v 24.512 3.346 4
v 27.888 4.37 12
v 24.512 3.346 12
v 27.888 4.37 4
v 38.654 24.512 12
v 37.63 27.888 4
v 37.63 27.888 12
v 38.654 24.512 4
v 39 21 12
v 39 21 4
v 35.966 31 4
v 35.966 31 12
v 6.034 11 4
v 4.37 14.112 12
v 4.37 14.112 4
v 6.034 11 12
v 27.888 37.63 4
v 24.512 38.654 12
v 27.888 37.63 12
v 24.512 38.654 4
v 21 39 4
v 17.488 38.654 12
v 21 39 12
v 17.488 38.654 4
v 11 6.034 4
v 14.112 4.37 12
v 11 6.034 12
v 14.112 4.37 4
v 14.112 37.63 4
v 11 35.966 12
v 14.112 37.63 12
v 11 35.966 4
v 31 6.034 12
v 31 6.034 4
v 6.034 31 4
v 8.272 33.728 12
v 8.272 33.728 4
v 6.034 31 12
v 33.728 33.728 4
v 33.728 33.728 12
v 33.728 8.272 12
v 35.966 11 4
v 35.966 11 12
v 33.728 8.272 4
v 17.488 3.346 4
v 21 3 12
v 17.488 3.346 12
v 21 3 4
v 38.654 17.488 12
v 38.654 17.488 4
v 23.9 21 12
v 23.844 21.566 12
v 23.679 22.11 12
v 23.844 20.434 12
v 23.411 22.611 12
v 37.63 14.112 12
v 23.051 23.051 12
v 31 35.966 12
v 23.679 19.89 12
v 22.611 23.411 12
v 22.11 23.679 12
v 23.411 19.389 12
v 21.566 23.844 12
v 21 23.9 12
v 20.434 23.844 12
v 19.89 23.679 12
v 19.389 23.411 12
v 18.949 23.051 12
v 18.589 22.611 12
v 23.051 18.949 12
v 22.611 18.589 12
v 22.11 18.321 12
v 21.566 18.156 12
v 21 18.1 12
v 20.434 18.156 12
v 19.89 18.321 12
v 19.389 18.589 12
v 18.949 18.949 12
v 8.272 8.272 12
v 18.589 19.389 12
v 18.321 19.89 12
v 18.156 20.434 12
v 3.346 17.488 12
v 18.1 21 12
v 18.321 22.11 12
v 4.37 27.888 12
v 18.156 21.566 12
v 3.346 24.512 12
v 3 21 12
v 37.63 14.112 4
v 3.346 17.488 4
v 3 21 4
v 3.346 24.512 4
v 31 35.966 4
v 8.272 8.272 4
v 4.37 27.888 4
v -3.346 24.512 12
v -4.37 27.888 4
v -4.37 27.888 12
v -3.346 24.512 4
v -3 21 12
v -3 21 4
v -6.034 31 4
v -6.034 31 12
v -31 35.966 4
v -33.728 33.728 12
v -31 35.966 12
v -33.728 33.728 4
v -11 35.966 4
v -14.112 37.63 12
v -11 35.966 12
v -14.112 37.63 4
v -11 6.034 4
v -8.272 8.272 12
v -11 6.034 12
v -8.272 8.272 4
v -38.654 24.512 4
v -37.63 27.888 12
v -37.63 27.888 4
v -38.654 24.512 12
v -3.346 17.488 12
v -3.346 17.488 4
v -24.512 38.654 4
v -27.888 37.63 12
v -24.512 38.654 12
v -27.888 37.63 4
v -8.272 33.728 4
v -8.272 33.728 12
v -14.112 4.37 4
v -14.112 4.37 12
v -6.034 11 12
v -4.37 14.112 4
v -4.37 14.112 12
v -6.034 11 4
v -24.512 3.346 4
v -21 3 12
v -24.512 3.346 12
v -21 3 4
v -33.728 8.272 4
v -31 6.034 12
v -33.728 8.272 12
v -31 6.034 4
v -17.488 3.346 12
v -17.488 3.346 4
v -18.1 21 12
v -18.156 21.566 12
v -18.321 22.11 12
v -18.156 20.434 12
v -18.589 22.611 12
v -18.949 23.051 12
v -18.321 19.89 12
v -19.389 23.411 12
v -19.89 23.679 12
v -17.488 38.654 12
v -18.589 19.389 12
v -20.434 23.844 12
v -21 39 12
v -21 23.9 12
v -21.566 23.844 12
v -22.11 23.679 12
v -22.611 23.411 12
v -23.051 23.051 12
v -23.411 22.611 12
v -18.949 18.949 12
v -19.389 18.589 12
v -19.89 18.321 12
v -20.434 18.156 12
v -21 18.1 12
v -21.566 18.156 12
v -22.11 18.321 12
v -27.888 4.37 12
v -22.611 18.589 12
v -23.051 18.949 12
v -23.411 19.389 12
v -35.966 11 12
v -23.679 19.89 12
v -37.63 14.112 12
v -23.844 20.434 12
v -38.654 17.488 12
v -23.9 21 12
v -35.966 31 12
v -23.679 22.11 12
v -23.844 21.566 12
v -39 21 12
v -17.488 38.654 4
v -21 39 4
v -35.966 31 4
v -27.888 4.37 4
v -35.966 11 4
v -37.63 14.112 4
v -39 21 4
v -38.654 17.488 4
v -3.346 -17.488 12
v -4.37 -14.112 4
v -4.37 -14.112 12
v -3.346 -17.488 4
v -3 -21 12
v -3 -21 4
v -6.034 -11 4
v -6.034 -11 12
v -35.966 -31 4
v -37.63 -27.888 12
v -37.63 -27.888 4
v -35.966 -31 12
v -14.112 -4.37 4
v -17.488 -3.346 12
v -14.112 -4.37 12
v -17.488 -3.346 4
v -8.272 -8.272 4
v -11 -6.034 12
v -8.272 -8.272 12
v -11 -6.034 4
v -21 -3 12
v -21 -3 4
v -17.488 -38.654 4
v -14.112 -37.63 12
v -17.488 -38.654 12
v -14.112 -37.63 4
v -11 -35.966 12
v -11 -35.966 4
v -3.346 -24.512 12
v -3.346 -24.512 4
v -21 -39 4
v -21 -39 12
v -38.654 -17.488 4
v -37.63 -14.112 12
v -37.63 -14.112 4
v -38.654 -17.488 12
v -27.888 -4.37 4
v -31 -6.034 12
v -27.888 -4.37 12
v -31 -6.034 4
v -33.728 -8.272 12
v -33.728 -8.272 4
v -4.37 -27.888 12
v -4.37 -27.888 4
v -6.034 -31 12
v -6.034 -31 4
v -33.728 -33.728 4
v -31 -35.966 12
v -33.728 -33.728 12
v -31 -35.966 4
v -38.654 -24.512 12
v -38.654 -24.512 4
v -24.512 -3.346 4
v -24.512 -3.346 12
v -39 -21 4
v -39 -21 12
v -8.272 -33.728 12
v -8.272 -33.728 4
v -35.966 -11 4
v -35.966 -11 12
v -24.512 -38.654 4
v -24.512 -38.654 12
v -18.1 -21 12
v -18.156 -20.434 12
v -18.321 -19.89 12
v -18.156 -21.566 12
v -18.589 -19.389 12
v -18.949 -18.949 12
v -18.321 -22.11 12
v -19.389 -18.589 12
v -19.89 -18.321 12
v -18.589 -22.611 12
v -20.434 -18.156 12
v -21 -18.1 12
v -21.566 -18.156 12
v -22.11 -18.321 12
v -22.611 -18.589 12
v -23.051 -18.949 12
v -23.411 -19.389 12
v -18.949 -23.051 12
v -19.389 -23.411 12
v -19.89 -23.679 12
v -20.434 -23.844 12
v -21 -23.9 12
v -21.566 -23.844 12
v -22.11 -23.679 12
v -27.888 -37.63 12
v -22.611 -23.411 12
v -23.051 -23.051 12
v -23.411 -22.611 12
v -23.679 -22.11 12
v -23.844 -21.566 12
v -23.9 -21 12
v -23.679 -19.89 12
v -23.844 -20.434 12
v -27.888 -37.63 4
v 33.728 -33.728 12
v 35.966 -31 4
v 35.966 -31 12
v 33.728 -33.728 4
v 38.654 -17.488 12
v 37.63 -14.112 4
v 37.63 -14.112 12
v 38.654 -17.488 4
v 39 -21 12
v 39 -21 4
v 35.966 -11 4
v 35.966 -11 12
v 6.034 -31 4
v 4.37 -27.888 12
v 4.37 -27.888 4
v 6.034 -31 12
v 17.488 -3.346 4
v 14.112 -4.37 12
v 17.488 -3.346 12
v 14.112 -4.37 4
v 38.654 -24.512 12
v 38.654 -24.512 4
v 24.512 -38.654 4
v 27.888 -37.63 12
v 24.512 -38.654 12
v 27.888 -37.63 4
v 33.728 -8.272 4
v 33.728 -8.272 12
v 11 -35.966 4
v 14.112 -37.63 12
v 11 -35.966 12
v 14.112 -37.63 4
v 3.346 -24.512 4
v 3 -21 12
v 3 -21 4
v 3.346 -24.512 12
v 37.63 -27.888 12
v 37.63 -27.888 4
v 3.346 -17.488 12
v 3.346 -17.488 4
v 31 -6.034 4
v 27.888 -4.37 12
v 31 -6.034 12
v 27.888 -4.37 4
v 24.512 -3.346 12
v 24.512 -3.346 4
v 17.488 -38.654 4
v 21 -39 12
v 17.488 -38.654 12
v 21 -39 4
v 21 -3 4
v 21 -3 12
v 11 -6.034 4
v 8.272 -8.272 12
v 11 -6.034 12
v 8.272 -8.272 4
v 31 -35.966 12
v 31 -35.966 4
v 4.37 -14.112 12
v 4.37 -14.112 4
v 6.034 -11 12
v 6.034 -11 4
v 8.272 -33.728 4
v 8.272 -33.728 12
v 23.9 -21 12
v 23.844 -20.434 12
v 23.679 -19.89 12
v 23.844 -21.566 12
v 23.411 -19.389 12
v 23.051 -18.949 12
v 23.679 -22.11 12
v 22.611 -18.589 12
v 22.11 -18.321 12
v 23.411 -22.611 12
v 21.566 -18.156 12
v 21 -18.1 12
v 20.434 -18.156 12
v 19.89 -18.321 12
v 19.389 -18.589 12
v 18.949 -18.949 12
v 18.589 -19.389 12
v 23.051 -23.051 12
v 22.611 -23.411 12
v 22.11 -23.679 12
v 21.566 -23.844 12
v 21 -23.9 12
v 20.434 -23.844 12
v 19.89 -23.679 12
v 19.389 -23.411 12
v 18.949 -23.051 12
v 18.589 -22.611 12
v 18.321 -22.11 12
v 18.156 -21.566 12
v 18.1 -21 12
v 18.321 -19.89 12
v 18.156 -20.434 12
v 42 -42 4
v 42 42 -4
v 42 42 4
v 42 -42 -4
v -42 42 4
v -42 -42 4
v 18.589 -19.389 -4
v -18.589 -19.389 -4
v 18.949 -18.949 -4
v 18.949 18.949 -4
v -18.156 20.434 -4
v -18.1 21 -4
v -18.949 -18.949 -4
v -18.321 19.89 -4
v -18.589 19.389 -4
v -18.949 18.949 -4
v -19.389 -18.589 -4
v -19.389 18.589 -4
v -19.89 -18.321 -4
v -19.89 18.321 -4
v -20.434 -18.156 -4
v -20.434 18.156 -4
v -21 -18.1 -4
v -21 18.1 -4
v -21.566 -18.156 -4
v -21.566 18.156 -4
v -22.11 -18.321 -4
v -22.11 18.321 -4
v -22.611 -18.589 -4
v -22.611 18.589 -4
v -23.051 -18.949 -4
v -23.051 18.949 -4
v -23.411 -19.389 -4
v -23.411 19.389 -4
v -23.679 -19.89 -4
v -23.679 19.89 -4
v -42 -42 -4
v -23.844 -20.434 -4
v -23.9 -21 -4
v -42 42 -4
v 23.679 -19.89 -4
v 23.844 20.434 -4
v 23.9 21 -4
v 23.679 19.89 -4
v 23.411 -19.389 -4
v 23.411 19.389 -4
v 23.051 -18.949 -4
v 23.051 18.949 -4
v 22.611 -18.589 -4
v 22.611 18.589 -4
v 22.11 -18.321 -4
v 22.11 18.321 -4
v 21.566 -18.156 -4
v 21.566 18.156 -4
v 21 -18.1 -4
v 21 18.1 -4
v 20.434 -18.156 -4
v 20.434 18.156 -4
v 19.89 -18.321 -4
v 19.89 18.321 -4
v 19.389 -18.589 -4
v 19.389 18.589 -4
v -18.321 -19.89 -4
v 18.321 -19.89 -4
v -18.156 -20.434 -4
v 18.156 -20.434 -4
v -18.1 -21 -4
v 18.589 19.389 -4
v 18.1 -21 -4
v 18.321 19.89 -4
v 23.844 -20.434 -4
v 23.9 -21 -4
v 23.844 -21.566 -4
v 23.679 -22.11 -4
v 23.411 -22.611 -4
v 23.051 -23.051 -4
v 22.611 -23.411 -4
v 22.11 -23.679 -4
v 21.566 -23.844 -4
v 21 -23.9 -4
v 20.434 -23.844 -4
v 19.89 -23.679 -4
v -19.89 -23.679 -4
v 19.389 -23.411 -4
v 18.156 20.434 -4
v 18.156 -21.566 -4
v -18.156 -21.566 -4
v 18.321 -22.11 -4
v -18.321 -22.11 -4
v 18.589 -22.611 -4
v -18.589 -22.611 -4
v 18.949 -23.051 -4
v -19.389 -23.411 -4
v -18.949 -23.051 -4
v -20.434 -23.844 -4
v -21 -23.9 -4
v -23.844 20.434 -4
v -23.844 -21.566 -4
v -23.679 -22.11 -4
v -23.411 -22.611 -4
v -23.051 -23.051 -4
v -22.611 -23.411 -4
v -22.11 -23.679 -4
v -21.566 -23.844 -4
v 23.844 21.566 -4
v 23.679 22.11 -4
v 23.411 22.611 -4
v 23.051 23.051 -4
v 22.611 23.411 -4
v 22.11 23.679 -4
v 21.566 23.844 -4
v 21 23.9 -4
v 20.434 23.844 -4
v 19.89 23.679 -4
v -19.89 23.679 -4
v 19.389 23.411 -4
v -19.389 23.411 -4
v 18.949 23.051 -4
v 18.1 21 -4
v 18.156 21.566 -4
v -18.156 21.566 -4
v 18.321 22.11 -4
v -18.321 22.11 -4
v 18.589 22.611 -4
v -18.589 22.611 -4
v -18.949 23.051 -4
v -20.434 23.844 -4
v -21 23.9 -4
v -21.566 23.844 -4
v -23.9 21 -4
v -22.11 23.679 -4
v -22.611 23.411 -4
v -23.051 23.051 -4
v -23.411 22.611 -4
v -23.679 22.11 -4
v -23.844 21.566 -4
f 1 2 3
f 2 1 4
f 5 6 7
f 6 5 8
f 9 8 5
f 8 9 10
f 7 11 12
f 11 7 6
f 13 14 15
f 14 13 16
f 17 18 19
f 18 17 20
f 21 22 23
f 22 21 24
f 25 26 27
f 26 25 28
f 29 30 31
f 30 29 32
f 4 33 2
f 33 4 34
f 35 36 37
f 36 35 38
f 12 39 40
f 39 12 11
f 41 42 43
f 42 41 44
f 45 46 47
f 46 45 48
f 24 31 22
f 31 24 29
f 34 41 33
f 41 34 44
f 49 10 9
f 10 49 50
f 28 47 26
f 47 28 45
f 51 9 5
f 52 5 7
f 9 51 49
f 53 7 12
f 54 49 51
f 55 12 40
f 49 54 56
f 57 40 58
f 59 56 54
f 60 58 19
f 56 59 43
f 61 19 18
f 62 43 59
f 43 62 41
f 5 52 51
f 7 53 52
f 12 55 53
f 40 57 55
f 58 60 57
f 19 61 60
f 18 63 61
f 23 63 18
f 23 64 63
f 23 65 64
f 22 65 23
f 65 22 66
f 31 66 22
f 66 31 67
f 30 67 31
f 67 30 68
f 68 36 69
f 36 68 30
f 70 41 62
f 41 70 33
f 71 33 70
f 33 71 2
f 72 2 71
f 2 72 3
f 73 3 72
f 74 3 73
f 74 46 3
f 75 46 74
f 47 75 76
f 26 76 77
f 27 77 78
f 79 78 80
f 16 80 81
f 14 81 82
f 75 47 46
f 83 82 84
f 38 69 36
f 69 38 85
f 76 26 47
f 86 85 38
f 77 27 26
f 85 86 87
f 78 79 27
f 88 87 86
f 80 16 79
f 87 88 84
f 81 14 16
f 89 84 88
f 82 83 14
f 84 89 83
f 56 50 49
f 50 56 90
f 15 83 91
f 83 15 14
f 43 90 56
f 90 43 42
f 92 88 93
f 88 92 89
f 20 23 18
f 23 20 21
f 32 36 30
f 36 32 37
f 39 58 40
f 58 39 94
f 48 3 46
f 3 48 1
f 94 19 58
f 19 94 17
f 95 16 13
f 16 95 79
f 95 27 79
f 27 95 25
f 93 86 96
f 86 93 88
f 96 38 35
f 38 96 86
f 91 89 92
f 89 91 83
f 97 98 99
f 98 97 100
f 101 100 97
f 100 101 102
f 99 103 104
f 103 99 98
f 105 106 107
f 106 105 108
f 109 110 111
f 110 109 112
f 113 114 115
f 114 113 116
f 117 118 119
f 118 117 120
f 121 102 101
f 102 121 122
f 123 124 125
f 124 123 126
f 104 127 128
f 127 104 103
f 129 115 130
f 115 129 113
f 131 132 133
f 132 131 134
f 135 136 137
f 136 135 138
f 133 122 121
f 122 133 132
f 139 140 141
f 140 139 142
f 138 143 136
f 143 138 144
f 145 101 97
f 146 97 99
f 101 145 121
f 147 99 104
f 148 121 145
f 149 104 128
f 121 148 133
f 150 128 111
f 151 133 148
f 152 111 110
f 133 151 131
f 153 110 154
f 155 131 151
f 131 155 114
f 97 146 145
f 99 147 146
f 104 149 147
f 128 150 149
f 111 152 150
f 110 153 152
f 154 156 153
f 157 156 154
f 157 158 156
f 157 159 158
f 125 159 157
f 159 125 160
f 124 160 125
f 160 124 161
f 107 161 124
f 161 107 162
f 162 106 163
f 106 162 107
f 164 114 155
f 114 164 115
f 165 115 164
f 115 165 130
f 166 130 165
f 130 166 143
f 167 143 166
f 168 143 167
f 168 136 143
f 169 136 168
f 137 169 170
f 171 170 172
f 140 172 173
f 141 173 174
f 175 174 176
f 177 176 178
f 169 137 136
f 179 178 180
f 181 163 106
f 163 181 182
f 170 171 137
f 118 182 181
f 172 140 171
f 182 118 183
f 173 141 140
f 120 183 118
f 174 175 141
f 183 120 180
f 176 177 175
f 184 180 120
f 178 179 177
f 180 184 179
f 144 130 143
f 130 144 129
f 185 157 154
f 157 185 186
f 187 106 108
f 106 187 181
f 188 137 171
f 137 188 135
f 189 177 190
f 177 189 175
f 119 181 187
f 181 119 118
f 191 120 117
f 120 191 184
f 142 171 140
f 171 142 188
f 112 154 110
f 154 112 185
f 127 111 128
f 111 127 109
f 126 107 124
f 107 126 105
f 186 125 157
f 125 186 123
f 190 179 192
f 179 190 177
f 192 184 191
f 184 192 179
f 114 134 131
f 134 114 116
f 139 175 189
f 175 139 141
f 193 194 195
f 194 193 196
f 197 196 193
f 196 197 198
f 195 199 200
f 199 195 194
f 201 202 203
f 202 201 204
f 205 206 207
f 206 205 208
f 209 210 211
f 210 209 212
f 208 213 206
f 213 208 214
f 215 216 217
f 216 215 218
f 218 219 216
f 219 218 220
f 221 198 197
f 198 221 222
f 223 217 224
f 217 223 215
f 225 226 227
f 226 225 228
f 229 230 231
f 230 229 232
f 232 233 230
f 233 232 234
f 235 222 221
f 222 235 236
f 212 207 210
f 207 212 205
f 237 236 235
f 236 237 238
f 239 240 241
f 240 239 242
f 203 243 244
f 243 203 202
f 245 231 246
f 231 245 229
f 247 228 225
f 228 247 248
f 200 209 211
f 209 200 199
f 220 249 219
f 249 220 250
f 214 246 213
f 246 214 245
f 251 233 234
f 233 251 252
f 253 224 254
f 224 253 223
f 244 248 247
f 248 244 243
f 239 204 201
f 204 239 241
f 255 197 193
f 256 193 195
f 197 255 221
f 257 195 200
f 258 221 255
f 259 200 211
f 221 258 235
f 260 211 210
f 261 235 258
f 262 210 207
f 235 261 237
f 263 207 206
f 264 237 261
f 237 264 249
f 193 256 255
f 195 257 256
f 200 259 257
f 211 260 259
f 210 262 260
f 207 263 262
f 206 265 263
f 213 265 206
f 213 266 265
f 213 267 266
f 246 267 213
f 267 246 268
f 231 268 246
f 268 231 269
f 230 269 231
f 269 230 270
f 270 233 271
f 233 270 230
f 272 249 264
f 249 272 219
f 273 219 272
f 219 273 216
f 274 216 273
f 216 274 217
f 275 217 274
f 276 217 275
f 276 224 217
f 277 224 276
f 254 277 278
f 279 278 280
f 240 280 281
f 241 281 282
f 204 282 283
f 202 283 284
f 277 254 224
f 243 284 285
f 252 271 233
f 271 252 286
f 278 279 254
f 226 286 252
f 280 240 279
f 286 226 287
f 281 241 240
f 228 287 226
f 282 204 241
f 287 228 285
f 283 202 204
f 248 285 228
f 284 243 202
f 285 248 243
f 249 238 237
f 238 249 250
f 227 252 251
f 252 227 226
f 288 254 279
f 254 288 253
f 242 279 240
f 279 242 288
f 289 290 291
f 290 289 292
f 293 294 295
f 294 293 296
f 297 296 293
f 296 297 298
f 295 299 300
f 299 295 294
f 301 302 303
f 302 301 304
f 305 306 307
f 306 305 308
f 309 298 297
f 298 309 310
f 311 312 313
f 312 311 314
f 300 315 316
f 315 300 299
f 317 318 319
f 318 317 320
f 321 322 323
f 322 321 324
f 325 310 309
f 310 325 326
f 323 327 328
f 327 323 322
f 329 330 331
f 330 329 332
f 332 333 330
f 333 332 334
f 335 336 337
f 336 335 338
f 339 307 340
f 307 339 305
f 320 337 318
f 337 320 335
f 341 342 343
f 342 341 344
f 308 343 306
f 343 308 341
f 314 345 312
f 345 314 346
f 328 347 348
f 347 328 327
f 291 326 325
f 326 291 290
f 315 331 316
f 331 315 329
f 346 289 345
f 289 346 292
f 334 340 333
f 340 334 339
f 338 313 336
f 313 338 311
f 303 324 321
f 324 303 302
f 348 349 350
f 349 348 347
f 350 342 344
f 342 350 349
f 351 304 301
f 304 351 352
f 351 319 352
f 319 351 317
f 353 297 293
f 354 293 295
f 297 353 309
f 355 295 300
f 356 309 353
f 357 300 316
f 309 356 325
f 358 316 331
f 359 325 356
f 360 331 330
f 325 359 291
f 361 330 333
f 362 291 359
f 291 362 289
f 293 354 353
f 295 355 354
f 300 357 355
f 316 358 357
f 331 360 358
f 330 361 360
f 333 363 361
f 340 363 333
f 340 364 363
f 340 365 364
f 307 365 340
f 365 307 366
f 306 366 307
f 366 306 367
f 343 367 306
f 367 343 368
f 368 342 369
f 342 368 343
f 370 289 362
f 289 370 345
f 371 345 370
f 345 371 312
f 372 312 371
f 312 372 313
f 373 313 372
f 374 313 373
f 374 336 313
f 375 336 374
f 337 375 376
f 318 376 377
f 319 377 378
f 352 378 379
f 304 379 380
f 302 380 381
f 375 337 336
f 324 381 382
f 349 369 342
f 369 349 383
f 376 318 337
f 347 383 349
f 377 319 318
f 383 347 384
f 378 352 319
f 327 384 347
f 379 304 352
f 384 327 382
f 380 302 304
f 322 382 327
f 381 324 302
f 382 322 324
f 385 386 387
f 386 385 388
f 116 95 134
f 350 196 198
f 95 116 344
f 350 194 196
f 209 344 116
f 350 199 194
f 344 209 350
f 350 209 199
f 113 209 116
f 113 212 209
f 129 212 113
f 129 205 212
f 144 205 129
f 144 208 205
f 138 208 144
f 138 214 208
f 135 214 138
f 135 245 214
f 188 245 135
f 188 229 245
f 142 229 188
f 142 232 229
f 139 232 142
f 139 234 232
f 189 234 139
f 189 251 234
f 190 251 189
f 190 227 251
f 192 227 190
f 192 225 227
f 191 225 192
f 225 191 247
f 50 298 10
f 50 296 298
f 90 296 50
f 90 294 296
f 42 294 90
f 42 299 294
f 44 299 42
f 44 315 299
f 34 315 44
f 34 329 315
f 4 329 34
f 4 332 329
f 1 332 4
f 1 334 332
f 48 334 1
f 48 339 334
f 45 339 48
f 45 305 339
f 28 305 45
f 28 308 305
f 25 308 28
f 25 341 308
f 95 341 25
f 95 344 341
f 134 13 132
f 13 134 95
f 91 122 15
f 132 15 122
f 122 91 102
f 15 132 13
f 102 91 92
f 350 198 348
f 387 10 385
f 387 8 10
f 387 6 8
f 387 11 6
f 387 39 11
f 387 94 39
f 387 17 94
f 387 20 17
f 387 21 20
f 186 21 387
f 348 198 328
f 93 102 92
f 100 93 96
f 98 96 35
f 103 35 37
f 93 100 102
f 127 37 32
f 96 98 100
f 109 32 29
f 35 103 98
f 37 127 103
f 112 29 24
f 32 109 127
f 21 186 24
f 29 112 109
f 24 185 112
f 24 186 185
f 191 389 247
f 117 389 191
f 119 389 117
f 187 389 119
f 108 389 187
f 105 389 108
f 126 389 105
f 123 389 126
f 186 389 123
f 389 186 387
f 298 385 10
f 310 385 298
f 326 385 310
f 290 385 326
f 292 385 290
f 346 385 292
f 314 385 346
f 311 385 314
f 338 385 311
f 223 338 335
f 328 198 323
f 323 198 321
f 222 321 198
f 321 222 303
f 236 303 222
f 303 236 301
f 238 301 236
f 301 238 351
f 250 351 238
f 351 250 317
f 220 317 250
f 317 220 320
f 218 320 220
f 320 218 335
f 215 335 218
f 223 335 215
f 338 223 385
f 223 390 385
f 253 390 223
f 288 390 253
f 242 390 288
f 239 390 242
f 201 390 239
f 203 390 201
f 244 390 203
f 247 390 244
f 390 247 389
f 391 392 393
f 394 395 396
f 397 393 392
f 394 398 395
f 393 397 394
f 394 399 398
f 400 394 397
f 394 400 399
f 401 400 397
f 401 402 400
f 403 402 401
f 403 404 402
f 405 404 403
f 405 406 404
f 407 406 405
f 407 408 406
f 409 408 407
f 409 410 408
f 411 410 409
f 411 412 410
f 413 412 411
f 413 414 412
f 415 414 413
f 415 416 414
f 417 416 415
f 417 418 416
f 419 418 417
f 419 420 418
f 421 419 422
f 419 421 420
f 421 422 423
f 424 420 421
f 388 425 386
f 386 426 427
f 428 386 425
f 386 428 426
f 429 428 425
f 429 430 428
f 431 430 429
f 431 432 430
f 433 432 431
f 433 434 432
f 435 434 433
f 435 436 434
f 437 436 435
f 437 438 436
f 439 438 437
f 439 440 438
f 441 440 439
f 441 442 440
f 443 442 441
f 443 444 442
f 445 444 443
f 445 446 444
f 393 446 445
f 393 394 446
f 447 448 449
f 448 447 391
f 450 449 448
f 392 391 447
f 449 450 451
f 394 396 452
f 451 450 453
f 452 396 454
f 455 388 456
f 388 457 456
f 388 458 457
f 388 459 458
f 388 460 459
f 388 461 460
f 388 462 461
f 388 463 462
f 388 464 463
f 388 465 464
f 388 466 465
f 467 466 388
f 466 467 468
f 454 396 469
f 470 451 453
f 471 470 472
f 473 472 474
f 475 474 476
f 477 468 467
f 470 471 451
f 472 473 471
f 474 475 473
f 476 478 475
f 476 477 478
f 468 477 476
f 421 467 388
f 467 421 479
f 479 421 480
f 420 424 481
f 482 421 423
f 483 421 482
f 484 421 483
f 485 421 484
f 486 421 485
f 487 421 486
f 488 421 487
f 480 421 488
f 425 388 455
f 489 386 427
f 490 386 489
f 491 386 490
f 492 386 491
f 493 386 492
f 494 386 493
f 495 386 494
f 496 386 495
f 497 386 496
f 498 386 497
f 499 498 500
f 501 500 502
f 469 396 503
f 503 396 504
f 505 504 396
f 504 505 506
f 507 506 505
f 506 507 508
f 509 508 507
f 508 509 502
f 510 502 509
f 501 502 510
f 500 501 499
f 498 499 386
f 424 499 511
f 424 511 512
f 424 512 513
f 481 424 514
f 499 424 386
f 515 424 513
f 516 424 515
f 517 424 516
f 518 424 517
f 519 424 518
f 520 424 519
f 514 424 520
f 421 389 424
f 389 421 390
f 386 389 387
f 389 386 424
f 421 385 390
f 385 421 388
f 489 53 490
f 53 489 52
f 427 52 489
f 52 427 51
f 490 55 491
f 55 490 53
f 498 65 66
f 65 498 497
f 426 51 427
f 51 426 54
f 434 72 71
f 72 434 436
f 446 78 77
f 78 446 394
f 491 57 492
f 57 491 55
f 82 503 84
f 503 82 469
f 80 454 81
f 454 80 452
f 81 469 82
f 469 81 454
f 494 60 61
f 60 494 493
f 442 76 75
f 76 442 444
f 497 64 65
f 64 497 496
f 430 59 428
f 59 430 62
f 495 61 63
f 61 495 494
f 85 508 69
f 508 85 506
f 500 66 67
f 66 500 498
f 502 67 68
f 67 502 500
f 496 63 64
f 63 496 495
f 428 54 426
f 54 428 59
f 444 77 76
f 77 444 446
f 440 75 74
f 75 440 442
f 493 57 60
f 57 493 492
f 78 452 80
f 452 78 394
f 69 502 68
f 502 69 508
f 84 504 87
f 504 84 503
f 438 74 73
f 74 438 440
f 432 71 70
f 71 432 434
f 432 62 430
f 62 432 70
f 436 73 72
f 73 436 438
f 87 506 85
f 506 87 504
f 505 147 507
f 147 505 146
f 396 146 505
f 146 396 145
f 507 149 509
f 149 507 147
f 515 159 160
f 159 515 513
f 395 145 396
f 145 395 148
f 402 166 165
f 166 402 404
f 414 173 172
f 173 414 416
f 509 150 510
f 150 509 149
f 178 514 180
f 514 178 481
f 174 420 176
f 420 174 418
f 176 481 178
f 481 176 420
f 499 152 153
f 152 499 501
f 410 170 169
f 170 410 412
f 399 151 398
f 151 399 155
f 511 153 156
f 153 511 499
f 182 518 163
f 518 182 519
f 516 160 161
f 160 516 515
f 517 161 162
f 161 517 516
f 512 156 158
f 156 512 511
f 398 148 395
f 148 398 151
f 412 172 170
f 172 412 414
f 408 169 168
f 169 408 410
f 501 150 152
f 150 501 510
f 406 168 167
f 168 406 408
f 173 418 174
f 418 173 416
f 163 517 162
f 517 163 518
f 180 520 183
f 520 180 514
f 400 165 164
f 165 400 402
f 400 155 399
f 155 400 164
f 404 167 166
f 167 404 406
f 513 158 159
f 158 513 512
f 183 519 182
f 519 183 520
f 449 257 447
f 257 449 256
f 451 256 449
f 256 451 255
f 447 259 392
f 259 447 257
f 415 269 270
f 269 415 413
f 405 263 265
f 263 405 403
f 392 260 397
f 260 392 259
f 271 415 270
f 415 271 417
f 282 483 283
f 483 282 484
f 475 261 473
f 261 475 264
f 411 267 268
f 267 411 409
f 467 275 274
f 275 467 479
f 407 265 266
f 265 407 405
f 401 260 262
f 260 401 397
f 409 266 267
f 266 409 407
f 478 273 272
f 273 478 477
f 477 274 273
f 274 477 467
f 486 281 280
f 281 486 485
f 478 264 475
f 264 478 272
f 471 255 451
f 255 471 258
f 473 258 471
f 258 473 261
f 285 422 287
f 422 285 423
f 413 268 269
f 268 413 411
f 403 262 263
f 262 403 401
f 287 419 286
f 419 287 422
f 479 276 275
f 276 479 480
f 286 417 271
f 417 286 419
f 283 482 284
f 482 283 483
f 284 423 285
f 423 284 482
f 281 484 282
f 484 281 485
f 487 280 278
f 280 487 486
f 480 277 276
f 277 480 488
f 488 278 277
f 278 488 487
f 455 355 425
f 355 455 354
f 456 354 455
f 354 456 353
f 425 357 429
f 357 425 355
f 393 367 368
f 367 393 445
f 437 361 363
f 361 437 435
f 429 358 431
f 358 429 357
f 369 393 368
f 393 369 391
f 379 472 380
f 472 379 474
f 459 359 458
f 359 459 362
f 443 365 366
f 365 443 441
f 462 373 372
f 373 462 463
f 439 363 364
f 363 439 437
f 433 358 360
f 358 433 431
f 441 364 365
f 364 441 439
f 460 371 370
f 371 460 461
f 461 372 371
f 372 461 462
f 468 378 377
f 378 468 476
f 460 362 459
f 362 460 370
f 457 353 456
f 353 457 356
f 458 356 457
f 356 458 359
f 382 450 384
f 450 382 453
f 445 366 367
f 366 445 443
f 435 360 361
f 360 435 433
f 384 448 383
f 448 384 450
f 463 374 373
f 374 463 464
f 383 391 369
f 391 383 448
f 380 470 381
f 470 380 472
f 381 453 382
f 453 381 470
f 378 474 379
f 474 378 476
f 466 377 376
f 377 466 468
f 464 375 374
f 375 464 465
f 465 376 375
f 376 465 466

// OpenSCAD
$fn = 32;

// ----------------------------------------------------------------------
// Anchor pads 84 x 84 x 16
// four corner bosses with anchor holes
// ----------------------------------------------------------------------

// --- parameters (mm) ---
plate = [84, 84, 8];    // base plate size (x, y, z)
pads = 4;               // boss count, one per corner
edge = 21;              // boss centre offset from the plate edge
boss_d = 36;            // boss diameter
boss_h = 8;             // boss height above the base plate
bore_d = 5.5;           // nominal hole diameter from the drawing
print_allowance = 0.3;  // clearance added for printing

// --- derived feature positions (mm) ---
hole_d = bore_d + print_allowance;  // = 5.8   hole diameter as printed
height = plate[2] + boss_h;         // = 16   overall height of the part
corner_x = plate[0] / 2 - edge;     // = 21   boss centre X
corner_y = plate[1] / 2 - edge;     // = 21   boss centre Y
feature_centers = [
  [corner_x, corner_y],
  [-corner_x, corner_y],
  [-corner_x, -corner_y],
  [corner_x, -corner_y]
];   // boss centres, anchor holes are drilled there

// base plate, four bosses standing on it, anchor holes all the way through
difference() {
  union() {
    cube(plate, center = true);
    for (centre = feature_centers)
      translate([centre[0], centre[1], plate[2] / 2 - 1])
        cylinder(d = boss_d, h = boss_h + 1);
  }
  for (centre = feature_centers)
    translate([centre[0], centre[1], -height])
      cylinder(d = hole_d, h = 2 * height + 2);  // through boss and plate
}
